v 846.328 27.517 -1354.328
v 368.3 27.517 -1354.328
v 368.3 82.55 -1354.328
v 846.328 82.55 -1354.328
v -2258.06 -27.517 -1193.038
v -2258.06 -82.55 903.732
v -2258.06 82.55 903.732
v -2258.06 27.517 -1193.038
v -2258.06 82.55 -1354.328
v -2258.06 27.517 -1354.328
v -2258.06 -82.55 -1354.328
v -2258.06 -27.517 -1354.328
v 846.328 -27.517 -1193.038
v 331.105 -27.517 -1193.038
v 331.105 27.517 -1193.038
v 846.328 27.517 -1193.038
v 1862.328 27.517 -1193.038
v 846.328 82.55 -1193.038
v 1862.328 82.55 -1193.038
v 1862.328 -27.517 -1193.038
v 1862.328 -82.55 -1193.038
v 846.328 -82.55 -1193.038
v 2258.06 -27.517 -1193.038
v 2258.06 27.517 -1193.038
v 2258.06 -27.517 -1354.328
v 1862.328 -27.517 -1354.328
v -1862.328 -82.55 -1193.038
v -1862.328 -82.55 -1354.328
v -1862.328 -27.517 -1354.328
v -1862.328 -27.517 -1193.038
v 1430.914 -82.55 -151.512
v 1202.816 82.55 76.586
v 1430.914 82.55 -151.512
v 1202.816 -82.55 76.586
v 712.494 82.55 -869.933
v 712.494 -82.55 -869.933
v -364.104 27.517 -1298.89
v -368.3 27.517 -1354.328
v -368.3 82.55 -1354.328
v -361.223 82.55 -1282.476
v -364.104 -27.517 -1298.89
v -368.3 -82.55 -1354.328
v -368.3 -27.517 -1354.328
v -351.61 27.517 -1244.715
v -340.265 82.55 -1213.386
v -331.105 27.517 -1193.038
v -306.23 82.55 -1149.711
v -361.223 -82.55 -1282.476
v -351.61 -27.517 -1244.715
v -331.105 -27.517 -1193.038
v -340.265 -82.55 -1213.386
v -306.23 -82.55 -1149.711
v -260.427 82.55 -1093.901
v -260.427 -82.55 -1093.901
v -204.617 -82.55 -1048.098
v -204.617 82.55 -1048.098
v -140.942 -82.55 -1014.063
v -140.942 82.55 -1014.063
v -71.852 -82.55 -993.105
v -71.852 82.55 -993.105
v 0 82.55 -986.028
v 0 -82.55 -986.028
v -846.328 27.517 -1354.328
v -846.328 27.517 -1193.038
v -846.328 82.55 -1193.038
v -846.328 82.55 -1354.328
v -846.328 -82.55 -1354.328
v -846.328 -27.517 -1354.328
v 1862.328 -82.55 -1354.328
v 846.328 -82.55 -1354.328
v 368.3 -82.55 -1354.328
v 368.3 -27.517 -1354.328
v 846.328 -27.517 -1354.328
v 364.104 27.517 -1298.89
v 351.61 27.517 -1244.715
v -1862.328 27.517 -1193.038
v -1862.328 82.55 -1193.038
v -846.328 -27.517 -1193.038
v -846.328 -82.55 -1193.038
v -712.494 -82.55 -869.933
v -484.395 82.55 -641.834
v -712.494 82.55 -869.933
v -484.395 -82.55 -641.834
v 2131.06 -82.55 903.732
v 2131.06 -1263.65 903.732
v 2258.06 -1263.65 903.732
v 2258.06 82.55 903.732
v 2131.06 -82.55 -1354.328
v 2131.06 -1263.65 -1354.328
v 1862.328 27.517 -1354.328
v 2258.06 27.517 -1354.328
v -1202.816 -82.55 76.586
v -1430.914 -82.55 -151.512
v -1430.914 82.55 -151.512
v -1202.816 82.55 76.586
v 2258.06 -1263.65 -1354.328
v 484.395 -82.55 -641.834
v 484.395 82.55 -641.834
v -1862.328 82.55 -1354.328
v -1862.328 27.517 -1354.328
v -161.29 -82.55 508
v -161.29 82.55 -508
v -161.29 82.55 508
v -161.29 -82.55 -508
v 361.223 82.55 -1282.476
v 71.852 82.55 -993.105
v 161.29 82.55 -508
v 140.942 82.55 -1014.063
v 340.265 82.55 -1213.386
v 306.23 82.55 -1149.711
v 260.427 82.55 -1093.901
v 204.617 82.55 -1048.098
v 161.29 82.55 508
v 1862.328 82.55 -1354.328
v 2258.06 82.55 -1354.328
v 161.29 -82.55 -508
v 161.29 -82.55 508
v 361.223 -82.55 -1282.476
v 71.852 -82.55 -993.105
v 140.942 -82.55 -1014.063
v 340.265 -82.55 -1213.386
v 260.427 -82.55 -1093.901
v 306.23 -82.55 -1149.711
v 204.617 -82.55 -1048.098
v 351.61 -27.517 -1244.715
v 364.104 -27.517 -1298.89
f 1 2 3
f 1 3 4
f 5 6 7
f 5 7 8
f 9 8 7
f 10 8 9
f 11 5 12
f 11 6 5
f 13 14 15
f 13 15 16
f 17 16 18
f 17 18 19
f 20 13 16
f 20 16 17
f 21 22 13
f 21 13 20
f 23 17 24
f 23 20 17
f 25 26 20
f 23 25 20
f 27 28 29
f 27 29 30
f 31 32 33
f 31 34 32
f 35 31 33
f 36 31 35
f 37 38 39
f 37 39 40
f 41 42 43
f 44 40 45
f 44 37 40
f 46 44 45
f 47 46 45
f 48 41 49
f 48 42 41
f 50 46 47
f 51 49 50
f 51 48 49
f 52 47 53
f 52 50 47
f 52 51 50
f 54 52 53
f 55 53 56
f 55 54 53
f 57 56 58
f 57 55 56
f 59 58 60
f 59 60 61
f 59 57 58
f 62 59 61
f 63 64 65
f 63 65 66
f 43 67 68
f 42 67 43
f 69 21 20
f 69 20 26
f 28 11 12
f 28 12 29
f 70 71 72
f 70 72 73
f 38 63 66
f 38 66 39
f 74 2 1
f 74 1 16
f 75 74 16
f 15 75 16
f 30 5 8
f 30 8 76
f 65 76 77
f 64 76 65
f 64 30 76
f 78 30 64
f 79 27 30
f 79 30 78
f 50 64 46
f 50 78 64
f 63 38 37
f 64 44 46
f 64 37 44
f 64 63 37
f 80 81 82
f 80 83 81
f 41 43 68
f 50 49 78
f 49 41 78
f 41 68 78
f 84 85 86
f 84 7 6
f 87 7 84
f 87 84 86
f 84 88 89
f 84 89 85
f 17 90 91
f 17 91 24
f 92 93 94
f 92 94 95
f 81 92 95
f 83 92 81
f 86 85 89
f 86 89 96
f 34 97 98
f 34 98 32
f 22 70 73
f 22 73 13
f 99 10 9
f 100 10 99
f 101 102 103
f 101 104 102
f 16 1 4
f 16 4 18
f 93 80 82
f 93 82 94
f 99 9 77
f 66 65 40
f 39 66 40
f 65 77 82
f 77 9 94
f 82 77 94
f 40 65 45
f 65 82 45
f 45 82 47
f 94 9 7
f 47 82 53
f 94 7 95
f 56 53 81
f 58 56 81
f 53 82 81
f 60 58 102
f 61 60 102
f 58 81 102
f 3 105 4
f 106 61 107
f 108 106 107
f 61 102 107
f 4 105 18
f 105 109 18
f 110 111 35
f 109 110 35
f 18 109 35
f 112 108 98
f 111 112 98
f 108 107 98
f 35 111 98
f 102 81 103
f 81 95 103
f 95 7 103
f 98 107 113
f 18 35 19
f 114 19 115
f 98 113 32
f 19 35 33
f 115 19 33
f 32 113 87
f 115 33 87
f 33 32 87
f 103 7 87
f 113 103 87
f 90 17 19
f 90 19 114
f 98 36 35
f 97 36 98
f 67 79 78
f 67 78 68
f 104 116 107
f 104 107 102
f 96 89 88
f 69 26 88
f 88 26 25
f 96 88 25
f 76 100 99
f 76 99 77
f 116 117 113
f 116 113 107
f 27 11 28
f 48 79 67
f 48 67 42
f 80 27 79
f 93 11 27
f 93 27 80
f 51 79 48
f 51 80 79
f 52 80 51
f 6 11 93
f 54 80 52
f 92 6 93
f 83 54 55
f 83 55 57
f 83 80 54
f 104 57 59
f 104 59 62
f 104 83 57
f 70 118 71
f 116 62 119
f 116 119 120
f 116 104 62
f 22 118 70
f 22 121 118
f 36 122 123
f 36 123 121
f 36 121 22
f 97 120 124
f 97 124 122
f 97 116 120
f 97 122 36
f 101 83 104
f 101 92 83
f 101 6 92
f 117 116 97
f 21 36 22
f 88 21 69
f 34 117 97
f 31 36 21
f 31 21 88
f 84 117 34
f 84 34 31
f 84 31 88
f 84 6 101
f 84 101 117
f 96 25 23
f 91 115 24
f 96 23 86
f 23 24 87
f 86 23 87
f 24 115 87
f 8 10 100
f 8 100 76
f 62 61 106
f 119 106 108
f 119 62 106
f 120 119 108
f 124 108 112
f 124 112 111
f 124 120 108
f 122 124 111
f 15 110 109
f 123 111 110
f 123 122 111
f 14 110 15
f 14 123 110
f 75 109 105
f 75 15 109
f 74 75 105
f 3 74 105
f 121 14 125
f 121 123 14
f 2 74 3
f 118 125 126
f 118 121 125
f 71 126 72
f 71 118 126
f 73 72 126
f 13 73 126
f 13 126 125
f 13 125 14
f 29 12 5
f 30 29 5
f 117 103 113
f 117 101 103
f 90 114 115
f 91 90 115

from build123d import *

# Parameters (mm, degrees)
F1_DEPTH = 82.55
F2_W     = 127
F2_H     = 2258.06
F3_DEPTH = 1181.1
F4_W     = 55.033317
F4_H     = 161.29
F5_DEPTH = 4516.12


with BuildPart() as f1:
    # F0 (on Front) → F1 (new body, symmetric)
    with BuildSketch(Plane.XZ):
        with BuildLine():
            Line((2258.06, -1354.328), (2258.06, 903.732))
            Line((2258.06, 903.732), (-2258.06, 903.732))
            Line((-2258.06, 903.732), (-2258.06, -1354.328))
            Line((-2258.06, -1354.328), (-1935.48, -1354.328))
            ThreePointArc((-1935.48, -1354.328), (-1368.591033, 14.263033), (0, 581.152))
            ThreePointArc((0, 581.152), (1368.591033, 14.263033), (1935.48, -1354.328))
            Line((1935.48, -1354.328), (2258.06, -1354.328))
        make_face()
        with BuildLine():
            ThreePointArc((0, 581.152), (-1368.591033, 14.263033), (-1935.48, -1354.328))
            Line((-1935.48, -1354.328), (-1862.328, -1354.328))
            Line((-1862.328, -1354.328), (-1862.328, -1193.038))
            Line((-1862.328, -1193.038), (-846.328, -1193.038))
            Line((-846.328, -1193.038), (-846.328, -1354.328))
            Line((-846.328, -1354.328), (-368.3, -1354.328))
            ThreePointArc((-368.3, -1354.328), (-260.427428, -1093.900572), (0, -986.028))
            Line((0, -986.028), (0, -508))
            Line((0, -508), (-161.29, -508))
            Line((-161.29, -508), (-161.29, 508))
            Line((-161.29, 508), (0, 508))
            Line((0, 508), (0, 581.152))
        make_face()
        Polygon((-712.493521, -869.932985), (-1430.91401, -151.512495), (-1202.815505, 76.58601), (-484.395015, -641.834479), align=None, mode=Mode.SUBTRACT)
        with BuildLine():
            Line((1862.328, -1354.328), (1935.48, -1354.328))
            ThreePointArc((1935.48, -1354.328), (1368.591033, 14.263033), (0, 581.152))
            Line((0, 581.152), (0, 508))
            Line((0, 508), (161.29, 508))
            Line((161.29, 508), (161.29, -508))
            Line((161.29, -508), (0, -508))
            Line((0, -508), (0, -986.028))
            ThreePointArc((0, -986.028), (260.427428, -1093.900572), (368.3, -1354.328))
            Line((368.3, -1354.328), (846.328, -1354.328))
            Line((846.328, -1354.328), (846.328, -1193.038))
            Line((846.328, -1193.038), (1862.328, -1193.038))
            Line((1862.328, -1193.038), (1862.328, -1354.328))
        make_face()
        Polygon((484.395015, -641.834479), (1202.815505, 76.58601), (1430.91401, -151.512495), (712.493521, -869.932985), align=None, mode=Mode.SUBTRACT)
    extrude(amount=F1_DEPTH, both=True)

    # F2 (on face) → F3 (join)
    with BuildSketch(Plane.XZ.offset(82.55)):
        with Locations((2194.56, -225.298)):
            Rectangle(F2_W, F2_H)
    extrude(amount=F3_DEPTH)

    # F4 (on face) → F5 (cut)
    with BuildSketch(Plane(origin=(-2258.06, 0, 0), x_dir=(0, -1, 0), z_dir=(-1, 0, 0))):
        with Locations((-2.5e-05, -1273.683)):
            Rectangle(F4_W, F4_H)
    extrude(amount=-F5_DEPTH, mode=Mode.SUBTRACT)


solid = f1.part
